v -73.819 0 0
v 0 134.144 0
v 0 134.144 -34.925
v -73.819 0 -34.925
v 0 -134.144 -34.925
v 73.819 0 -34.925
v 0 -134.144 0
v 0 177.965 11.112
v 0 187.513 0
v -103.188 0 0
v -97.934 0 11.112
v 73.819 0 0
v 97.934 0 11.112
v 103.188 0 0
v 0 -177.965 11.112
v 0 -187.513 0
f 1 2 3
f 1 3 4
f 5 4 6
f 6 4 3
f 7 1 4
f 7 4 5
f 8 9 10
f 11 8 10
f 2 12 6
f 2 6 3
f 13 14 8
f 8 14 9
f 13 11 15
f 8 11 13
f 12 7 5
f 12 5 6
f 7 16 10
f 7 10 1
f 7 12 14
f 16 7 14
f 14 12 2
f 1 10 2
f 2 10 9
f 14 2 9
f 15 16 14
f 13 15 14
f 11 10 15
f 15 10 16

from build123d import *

# Parameters (mm, degrees)
F1_DEPTH = 34.925
F2_DEPTH = 11.1125
F3_SIZE2 = 11.11249
F3_SIZE  = 4.602938


# Not quite as in the source:
# - a fillet or chamfer is up to 0.001 mm smaller than in the source, because OpenCascade refuses the exact size


with BuildPart() as f1:
    # F0 (on Top) → F1 (new body)
    with BuildSketch(Plane.XY):
        Polygon((0, -134.14375), (0, 134.14375), (-73.81875, 0), align=None)
        Polygon((73.81875, 0), (0, 134.14375), (0, -134.14375), align=None)
    extrude(amount=-F1_DEPTH)

    # F0 (on Top) + F1_face (on face) → F2 (join)
    with BuildSketch(Plane.XY):
        Polygon((-103.1875, 0), (0, -187.5127688172), (103.1875, 0), (0, 187.5127688172), align=None)
        Polygon((-73.81875, 0), (0, 134.14375), (73.81875, 0), (0, -134.14375), align=None, mode=Mode.SUBTRACT)
    with BuildSketch(Plane.XY):
        Polygon((0, 134.14375), (-73.81875, 0), (0, -134.14375), (73.81875, 0), align=None)
    extrude(amount=F2_DEPTH)

    # F3 (size 4.6029482119 and 11.1125 in the source; OpenCascade refuses exactly that, so slightly less here)
    f3_edges = [f1.edges().sort_by_distance(p)[0] for p in [
        (-51.59375, -93.756384, 11.1125),
        (-51.59375, 93.756384, 11.1125),
        (51.59375, 93.756384, 11.1125),
        (51.59375, -93.756384, 11.1125),
    ]]
    f3_side = f1.faces().sort_by_distance((0, 0, 11.1125))[0]
    chamfer(f3_edges, length=F3_SIZE, length2=F3_SIZE2, reference=f3_side)


solid = f1.part
